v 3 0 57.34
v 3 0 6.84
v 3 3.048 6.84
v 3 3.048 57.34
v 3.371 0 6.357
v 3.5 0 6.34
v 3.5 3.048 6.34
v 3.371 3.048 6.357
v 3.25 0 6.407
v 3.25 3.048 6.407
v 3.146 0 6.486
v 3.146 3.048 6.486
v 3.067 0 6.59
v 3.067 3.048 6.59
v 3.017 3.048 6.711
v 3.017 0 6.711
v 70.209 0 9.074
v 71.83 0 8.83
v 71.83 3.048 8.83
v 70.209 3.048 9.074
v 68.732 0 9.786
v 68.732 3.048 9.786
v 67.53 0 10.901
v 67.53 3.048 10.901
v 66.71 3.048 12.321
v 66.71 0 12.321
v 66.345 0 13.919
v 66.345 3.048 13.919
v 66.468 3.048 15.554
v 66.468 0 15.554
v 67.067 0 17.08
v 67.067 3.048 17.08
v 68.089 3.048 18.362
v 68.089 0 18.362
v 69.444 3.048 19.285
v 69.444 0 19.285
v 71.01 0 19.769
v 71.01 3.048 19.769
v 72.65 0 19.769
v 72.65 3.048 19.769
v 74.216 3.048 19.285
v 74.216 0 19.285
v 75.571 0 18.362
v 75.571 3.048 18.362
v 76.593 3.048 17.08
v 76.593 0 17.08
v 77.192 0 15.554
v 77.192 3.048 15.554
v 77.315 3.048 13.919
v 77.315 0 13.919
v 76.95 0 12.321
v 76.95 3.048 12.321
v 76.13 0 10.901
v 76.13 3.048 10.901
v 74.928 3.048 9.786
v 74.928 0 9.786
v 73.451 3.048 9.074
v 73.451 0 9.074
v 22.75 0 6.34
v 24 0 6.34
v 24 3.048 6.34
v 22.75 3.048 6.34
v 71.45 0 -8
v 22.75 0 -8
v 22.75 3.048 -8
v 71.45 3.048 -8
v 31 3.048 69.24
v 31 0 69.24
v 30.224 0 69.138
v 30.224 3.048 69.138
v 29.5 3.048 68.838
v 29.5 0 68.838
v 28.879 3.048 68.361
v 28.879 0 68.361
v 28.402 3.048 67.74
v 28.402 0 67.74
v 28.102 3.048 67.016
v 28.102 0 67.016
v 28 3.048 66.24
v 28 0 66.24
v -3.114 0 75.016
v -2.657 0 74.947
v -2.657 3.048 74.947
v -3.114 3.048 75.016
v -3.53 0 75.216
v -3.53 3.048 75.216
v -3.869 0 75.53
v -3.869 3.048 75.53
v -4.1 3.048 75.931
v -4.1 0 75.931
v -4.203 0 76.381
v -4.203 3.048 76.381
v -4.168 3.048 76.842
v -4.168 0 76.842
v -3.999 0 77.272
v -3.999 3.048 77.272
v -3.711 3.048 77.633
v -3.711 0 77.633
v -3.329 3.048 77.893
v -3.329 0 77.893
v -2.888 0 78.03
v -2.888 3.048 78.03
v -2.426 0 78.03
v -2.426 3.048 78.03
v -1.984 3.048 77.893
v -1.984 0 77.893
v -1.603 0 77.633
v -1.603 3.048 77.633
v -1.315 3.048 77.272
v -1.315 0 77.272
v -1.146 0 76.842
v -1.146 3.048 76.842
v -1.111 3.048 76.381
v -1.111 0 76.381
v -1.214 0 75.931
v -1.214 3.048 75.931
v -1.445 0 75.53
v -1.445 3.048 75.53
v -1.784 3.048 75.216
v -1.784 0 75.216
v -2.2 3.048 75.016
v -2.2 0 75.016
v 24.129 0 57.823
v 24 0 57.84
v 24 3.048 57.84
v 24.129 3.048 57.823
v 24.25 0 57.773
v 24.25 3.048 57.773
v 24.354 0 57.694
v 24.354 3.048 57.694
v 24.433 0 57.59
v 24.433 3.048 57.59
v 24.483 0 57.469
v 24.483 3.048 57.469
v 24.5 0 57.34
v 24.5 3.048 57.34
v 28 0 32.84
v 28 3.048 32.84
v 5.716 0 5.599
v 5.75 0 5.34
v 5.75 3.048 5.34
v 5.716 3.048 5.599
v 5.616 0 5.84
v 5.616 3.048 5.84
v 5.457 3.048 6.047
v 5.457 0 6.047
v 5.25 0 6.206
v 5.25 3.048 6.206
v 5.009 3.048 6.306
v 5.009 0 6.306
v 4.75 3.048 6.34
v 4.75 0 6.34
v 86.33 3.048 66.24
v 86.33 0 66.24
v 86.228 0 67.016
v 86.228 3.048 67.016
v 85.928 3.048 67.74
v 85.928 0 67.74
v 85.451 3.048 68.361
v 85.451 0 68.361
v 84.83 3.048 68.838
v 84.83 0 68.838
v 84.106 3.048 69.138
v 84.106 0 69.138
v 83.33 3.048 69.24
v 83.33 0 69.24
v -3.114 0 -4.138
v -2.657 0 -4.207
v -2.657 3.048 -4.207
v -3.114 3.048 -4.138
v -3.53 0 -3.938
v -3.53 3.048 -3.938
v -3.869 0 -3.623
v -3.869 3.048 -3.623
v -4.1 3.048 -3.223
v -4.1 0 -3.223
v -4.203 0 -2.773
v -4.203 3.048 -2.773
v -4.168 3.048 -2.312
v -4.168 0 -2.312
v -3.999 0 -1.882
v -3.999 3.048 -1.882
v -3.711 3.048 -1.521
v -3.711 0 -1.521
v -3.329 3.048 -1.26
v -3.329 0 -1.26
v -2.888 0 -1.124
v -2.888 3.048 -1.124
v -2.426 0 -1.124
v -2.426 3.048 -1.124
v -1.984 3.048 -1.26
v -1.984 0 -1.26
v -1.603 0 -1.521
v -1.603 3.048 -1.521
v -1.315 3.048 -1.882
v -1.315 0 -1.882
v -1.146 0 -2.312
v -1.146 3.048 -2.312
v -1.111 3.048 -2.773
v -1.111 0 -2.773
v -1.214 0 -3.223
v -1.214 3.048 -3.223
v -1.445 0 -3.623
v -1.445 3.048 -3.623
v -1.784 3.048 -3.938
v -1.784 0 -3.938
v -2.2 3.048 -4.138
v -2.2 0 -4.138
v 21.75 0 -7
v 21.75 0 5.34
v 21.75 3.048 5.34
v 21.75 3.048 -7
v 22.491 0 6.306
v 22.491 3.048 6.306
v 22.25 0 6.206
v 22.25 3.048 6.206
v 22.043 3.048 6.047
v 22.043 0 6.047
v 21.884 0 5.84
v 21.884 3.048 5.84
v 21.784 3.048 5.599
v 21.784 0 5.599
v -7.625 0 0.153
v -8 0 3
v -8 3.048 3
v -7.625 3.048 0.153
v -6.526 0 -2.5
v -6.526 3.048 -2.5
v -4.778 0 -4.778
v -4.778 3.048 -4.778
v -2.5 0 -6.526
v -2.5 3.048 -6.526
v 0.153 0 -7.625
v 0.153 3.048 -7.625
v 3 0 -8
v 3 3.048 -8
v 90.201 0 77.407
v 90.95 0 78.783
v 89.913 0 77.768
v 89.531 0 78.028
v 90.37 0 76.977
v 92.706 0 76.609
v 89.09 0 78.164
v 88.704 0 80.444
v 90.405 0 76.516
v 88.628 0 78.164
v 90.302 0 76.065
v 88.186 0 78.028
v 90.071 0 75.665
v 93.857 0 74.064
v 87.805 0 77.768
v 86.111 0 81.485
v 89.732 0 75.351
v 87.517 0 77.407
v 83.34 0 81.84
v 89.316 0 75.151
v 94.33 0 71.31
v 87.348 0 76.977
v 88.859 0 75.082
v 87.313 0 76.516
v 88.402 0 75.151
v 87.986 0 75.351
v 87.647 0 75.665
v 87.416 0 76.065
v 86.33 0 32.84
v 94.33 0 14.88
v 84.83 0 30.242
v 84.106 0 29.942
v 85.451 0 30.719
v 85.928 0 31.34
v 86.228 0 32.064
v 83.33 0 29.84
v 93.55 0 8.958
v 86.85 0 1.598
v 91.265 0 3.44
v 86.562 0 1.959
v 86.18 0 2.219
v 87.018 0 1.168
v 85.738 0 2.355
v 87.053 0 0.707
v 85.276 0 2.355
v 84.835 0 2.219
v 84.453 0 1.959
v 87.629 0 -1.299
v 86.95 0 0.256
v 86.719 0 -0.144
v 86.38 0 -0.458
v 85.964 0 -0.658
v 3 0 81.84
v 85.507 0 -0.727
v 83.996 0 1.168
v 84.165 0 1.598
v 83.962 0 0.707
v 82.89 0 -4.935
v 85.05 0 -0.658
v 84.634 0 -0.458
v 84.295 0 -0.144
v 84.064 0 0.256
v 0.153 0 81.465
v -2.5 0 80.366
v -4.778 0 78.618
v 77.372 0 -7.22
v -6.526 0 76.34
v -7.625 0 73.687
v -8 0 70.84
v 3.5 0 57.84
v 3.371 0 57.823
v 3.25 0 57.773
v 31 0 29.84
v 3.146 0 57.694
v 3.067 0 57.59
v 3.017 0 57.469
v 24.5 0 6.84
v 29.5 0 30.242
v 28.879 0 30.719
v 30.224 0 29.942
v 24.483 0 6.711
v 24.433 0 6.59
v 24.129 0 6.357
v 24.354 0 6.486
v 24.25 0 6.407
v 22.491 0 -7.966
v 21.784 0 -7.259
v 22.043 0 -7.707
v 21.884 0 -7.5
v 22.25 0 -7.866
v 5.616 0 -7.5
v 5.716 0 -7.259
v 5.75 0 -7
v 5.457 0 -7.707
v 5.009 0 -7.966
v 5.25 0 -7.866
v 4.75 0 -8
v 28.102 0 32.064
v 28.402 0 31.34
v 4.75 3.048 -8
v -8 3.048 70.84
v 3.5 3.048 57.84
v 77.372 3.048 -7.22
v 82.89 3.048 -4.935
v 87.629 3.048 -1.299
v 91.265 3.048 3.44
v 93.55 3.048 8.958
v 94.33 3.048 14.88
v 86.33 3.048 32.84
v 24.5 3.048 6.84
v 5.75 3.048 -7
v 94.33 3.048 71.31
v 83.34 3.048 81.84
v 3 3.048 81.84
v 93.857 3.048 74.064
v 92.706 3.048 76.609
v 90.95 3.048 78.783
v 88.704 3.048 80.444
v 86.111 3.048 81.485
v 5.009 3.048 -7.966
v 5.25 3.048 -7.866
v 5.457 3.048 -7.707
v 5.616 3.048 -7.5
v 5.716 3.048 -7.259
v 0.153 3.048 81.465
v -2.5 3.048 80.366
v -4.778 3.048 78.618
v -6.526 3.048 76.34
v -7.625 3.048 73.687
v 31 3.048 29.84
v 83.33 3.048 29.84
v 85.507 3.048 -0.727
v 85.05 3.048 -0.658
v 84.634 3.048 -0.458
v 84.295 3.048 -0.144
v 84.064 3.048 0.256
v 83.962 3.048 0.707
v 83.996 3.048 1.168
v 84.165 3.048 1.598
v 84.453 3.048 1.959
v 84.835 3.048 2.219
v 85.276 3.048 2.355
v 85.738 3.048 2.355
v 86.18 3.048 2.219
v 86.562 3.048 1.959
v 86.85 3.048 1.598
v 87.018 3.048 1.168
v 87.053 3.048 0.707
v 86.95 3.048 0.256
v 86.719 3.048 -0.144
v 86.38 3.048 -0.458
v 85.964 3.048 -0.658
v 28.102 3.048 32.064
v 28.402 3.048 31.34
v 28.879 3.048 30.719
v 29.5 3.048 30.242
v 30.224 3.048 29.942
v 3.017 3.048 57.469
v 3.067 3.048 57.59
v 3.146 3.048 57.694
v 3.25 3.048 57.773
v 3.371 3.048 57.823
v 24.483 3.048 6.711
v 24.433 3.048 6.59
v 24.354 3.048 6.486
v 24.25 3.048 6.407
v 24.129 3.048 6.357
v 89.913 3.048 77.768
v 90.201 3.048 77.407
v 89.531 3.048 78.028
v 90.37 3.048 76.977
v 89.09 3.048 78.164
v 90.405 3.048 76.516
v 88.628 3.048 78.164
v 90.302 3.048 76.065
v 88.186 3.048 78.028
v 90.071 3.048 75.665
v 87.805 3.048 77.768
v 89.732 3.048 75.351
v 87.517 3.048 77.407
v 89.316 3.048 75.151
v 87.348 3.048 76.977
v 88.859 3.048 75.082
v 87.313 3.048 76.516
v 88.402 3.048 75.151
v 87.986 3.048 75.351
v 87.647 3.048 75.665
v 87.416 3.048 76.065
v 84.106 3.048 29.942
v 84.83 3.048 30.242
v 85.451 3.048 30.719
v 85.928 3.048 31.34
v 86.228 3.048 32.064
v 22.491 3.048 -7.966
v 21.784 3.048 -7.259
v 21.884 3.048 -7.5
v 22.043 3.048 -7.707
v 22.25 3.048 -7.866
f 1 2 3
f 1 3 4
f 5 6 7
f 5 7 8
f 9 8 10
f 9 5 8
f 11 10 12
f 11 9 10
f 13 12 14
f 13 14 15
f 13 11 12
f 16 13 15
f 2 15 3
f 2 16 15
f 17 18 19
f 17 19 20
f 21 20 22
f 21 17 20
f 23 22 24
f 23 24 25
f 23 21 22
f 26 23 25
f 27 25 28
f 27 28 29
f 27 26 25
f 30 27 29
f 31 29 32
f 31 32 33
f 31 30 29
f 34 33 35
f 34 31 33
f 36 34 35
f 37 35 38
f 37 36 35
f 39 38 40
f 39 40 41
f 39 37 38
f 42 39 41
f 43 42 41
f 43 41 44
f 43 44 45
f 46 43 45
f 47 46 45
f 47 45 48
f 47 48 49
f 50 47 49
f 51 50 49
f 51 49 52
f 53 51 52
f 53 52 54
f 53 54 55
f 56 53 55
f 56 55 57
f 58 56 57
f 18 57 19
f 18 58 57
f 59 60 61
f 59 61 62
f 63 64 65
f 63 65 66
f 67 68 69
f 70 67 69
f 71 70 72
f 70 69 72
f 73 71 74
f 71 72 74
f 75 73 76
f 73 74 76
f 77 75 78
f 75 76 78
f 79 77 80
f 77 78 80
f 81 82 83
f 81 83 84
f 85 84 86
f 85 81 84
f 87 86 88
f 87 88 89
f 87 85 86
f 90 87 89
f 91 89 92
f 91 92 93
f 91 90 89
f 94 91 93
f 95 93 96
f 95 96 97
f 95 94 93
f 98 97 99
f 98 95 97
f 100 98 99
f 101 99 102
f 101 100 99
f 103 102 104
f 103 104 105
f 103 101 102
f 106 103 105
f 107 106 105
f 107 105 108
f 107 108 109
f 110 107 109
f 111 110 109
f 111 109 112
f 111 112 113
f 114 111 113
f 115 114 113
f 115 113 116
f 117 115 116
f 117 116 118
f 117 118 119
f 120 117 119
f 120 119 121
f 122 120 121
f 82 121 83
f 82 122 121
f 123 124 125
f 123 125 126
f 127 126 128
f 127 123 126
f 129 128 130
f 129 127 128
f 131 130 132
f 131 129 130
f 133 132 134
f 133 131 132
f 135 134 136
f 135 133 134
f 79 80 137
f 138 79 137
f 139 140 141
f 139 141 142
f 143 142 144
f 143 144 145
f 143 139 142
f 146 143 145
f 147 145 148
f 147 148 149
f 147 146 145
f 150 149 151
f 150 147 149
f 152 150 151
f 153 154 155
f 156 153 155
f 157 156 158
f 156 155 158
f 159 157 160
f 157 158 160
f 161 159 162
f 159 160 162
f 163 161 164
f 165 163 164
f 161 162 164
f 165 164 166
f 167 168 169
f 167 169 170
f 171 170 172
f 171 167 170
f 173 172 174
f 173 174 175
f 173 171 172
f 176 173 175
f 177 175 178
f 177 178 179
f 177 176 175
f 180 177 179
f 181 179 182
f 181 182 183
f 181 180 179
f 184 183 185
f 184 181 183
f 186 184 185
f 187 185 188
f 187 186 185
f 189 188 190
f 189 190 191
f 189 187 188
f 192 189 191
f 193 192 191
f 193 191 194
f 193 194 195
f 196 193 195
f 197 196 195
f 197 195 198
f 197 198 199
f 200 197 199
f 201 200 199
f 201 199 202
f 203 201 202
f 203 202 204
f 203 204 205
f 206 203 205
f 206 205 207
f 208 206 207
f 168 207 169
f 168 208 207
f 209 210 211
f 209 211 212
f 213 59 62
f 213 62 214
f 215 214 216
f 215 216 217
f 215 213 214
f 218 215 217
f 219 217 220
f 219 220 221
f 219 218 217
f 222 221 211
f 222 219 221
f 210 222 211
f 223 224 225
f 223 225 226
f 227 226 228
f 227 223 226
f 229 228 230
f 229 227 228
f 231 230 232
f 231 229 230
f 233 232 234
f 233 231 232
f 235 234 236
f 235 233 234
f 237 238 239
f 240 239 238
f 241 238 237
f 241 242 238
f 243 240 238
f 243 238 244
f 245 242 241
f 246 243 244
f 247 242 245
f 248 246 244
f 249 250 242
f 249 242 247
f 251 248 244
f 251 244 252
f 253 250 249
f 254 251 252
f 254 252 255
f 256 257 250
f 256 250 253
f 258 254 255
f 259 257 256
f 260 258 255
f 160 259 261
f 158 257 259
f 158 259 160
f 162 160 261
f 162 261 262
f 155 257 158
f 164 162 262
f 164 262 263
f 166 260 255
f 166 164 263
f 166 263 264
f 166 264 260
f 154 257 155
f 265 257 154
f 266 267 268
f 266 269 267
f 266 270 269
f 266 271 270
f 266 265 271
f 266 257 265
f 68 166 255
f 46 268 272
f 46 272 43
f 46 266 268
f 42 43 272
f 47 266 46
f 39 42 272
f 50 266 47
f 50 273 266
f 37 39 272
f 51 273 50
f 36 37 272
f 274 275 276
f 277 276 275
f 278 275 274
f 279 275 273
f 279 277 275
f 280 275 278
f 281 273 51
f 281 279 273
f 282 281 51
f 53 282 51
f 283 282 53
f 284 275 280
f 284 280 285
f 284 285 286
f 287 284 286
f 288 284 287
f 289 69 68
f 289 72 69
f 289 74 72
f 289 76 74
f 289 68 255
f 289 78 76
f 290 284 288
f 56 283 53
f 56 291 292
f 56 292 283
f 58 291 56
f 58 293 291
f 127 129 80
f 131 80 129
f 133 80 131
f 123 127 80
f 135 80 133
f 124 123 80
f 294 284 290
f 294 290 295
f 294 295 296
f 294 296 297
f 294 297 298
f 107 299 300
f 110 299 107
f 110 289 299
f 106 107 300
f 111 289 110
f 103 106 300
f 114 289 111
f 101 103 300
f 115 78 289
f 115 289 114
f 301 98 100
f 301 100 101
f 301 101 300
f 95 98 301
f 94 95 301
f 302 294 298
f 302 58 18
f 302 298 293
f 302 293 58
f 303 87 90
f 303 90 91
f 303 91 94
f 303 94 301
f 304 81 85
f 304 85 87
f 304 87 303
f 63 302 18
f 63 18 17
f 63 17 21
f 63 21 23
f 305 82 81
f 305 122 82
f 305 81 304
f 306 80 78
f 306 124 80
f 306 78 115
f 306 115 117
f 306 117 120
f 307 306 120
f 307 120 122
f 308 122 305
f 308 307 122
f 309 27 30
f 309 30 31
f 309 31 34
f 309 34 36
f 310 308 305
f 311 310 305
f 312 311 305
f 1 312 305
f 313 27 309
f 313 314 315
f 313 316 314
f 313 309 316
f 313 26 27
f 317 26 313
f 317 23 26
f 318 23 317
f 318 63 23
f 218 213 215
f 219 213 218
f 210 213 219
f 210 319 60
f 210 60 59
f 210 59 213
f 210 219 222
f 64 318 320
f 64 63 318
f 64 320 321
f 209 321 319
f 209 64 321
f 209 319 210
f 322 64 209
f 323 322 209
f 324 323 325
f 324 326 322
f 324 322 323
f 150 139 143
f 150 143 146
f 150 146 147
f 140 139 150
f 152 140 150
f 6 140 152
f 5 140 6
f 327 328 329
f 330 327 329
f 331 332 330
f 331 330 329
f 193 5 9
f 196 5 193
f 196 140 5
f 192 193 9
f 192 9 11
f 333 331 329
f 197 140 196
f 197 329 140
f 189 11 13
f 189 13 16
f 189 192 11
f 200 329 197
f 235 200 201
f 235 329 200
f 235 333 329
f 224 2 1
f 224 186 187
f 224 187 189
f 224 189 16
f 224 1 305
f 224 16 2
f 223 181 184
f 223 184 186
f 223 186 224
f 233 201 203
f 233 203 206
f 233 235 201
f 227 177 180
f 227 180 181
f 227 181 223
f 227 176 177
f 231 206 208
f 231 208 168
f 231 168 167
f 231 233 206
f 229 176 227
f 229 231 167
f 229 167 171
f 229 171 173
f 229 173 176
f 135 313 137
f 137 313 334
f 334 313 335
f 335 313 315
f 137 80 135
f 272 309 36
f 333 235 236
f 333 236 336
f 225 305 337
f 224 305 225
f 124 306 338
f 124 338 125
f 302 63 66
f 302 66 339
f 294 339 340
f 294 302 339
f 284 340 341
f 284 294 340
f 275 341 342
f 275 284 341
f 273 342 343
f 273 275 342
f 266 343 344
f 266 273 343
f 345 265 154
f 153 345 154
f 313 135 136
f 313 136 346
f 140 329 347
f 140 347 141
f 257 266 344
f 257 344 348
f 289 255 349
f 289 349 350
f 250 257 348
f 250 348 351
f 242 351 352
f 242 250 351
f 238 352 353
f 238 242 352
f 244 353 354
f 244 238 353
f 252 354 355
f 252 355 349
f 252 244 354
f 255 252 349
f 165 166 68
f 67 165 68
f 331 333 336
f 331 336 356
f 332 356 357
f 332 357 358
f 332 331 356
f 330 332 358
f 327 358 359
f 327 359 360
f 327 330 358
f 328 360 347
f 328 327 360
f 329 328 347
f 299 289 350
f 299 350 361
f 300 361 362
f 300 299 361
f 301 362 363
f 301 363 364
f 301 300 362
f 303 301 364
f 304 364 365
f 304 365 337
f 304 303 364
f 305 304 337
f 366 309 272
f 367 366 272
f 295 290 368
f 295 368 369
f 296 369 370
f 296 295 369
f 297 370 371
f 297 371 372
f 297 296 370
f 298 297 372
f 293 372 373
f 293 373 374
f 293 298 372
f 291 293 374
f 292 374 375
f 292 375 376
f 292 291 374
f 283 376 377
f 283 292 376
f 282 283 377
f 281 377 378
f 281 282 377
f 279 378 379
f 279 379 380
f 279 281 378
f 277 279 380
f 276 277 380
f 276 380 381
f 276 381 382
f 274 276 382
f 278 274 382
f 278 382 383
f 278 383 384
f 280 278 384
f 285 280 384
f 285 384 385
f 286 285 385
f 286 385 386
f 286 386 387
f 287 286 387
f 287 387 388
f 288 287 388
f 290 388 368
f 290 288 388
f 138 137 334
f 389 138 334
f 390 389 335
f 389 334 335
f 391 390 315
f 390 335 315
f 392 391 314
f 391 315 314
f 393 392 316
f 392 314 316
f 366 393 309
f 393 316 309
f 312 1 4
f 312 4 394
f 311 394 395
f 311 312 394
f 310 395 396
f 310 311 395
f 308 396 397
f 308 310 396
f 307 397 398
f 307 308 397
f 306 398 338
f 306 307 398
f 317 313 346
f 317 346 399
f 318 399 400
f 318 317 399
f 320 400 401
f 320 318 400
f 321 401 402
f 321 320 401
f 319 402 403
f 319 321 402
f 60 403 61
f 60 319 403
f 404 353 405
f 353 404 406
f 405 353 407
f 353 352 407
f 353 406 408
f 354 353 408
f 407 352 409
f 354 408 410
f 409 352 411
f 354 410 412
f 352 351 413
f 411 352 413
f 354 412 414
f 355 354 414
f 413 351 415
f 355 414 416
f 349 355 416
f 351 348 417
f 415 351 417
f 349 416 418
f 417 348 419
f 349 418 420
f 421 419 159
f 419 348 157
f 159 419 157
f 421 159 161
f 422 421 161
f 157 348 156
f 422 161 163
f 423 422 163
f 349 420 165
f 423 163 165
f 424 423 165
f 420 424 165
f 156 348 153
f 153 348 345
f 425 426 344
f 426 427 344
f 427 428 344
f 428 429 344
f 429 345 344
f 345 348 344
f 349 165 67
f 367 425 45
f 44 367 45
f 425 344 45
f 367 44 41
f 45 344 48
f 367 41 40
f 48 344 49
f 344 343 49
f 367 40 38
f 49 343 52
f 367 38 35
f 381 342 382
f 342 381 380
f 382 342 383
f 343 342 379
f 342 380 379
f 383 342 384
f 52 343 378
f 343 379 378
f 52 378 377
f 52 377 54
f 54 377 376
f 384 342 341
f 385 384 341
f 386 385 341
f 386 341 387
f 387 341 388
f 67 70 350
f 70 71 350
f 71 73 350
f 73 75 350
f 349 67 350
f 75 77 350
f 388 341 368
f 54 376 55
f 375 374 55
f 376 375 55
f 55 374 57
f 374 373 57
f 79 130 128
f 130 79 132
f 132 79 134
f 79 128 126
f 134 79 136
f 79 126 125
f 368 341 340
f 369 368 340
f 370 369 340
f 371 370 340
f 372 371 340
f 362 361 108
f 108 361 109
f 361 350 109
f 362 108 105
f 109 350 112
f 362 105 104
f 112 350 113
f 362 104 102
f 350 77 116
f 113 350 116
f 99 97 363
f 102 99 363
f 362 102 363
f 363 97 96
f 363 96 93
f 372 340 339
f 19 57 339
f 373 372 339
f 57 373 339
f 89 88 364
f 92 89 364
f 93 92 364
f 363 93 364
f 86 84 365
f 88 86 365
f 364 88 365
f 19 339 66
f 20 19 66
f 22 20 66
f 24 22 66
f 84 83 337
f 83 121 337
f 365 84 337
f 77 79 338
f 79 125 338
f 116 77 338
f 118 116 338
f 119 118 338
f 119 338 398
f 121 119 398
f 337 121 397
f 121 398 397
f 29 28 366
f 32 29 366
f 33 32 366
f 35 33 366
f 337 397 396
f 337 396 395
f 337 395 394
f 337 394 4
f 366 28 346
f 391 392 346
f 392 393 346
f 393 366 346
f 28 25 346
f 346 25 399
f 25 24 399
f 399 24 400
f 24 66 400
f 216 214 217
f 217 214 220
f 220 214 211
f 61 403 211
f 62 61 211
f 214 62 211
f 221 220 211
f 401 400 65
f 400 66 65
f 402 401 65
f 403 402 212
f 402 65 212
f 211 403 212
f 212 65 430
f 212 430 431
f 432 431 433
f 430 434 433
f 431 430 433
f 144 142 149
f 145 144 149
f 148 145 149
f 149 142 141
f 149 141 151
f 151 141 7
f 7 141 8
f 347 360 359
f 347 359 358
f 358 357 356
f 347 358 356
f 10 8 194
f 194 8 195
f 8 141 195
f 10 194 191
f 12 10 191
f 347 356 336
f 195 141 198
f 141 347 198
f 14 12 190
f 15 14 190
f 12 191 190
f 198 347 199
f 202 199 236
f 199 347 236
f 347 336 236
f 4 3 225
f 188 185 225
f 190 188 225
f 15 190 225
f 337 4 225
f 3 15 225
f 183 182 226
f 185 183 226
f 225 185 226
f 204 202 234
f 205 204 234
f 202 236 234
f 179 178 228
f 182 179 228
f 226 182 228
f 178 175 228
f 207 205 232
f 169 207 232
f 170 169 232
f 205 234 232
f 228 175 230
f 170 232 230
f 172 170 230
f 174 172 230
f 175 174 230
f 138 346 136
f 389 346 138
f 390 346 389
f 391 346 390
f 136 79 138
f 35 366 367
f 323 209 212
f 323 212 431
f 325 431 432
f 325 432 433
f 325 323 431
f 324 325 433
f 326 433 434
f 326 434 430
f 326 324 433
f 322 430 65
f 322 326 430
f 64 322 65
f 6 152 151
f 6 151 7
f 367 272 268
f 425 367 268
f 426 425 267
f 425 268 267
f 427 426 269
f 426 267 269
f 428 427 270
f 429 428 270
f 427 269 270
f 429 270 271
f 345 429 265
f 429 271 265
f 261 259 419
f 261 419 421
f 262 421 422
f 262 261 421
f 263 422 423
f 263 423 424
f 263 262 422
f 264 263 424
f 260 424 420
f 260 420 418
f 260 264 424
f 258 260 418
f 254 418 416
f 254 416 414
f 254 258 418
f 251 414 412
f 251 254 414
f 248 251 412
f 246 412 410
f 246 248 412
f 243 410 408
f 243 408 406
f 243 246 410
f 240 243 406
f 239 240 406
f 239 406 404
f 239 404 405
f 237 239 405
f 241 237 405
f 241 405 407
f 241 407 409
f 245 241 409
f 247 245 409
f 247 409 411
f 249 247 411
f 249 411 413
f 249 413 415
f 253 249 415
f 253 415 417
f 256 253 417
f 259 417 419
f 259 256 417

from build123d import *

# Parameters (mm, degrees)
SKETCH2_R           = 5.5
SKETCH2_R_2         = 1.55
BOSS_EXTRUDE1_DEPTH = 3.048


with BuildPart() as part:
    # Sketch2 → Boss-Extrude1 (new body)
    with BuildSketch(Plane(origin=(0, 0, 0), x_dir=(1, 0, 0), z_dir=(0, 1, 0))):
        with BuildLine():
            Line((3, -6.84), (3, -57.34))
            ThreePointArc((3, -57.34), (3.146446609, -57.693553391), (3.5, -57.84))
            Line((3.5, -57.84), (24, -57.84))
            ThreePointArc((24, -57.84), (24.353553391, -57.693553391), (24.5, -57.34))
            Line((24.5, -57.34), (24.5, -6.84))
            ThreePointArc((24.5, -6.84), (24.353553391, -6.486446609), (24, -6.34))
            Line((24, -6.34), (22.75, -6.34))
            ThreePointArc((22.75, -6.34), (22.042893219, -6.047106781), (21.75, -5.34))
            Line((21.75, -5.34), (21.75, 7))
            ThreePointArc((21.75, 7), (22.042893219, 7.707106781), (22.75, 8))
            Line((22.75, 8), (71.45, 8))
            ThreePointArc((71.45, 8), (87.628603154, 1.298603154), (94.33, -14.88))
            Line((94.33, -14.88), (94.33, -71.310147445))
            ThreePointArc((94.33, -71.310147445), (90.950189058, -78.782657675), (83.340051803, -81.84))
            Line((83.340051803, -81.84), (3, -81.84))
            ThreePointArc((3, -81.84), (-4.778174593, -78.618174593), (-8, -70.84))
            Line((-8, -70.84), (-8, -3))
            ThreePointArc((-8, -3), (-4.778174593, 4.778174593), (3, 8))
            Line((3, 8), (4.75, 8))
            ThreePointArc((4.75, 8), (5.457106781, 7.707106781), (5.75, 7))
            Line((5.75, 7), (5.75, -5.34))
            ThreePointArc((5.75, -5.34), (5.457106781, -6.047106781), (4.75, -6.34))
            Line((4.75, -6.34), (3.5, -6.34))
            ThreePointArc((3.5, -6.34), (3.146446609, -6.486446609), (3, -6.84))
        make_face()
        with Locations(Location((71.83, -14.33, 0), (0, 0, 90))):
            Circle(SKETCH2_R, mode=Mode.SUBTRACT)
        with Locations(Location((-2.656854249, 2.656854249, 0), (0, 0, 90))):
            Circle(SKETCH2_R_2, mode=Mode.SUBTRACT)
        with Locations(Location((85.50728281, -0.82271719, 0), (0, 0, 90))):
            Circle(SKETCH2_R_2, mode=Mode.SUBTRACT)
        with Locations(Location((88.858862501, -76.631761762, 0), (0, 0, 90))):
            Circle(SKETCH2_R_2, mode=Mode.SUBTRACT)
        with Locations(Location((-2.656854249, -76.496854249, 0), (0, 0, 90))):
            Circle(SKETCH2_R_2, mode=Mode.SUBTRACT)
        with BuildLine():
            Line((28, -66.24), (28, -32.84))
            ThreePointArc((28, -32.84), (28.878679656, -30.718679656), (31, -29.84))
            Line((31, -29.84), (83.33, -29.84))
            ThreePointArc((83.33, -29.84), (85.451320344, -30.718679656), (86.33, -32.84))
            Line((86.33, -32.84), (86.33, -66.24))
            ThreePointArc((86.33, -66.24), (85.451320344, -68.361320344), (83.33, -69.24))
            Line((83.33, -69.24), (31, -69.24))
            ThreePointArc((31, -69.24), (28.878679656, -68.361320344), (28, -66.24))
        make_face(mode=Mode.SUBTRACT)
    extrude(amount=BOSS_EXTRUDE1_DEPTH)


solid = part.part
